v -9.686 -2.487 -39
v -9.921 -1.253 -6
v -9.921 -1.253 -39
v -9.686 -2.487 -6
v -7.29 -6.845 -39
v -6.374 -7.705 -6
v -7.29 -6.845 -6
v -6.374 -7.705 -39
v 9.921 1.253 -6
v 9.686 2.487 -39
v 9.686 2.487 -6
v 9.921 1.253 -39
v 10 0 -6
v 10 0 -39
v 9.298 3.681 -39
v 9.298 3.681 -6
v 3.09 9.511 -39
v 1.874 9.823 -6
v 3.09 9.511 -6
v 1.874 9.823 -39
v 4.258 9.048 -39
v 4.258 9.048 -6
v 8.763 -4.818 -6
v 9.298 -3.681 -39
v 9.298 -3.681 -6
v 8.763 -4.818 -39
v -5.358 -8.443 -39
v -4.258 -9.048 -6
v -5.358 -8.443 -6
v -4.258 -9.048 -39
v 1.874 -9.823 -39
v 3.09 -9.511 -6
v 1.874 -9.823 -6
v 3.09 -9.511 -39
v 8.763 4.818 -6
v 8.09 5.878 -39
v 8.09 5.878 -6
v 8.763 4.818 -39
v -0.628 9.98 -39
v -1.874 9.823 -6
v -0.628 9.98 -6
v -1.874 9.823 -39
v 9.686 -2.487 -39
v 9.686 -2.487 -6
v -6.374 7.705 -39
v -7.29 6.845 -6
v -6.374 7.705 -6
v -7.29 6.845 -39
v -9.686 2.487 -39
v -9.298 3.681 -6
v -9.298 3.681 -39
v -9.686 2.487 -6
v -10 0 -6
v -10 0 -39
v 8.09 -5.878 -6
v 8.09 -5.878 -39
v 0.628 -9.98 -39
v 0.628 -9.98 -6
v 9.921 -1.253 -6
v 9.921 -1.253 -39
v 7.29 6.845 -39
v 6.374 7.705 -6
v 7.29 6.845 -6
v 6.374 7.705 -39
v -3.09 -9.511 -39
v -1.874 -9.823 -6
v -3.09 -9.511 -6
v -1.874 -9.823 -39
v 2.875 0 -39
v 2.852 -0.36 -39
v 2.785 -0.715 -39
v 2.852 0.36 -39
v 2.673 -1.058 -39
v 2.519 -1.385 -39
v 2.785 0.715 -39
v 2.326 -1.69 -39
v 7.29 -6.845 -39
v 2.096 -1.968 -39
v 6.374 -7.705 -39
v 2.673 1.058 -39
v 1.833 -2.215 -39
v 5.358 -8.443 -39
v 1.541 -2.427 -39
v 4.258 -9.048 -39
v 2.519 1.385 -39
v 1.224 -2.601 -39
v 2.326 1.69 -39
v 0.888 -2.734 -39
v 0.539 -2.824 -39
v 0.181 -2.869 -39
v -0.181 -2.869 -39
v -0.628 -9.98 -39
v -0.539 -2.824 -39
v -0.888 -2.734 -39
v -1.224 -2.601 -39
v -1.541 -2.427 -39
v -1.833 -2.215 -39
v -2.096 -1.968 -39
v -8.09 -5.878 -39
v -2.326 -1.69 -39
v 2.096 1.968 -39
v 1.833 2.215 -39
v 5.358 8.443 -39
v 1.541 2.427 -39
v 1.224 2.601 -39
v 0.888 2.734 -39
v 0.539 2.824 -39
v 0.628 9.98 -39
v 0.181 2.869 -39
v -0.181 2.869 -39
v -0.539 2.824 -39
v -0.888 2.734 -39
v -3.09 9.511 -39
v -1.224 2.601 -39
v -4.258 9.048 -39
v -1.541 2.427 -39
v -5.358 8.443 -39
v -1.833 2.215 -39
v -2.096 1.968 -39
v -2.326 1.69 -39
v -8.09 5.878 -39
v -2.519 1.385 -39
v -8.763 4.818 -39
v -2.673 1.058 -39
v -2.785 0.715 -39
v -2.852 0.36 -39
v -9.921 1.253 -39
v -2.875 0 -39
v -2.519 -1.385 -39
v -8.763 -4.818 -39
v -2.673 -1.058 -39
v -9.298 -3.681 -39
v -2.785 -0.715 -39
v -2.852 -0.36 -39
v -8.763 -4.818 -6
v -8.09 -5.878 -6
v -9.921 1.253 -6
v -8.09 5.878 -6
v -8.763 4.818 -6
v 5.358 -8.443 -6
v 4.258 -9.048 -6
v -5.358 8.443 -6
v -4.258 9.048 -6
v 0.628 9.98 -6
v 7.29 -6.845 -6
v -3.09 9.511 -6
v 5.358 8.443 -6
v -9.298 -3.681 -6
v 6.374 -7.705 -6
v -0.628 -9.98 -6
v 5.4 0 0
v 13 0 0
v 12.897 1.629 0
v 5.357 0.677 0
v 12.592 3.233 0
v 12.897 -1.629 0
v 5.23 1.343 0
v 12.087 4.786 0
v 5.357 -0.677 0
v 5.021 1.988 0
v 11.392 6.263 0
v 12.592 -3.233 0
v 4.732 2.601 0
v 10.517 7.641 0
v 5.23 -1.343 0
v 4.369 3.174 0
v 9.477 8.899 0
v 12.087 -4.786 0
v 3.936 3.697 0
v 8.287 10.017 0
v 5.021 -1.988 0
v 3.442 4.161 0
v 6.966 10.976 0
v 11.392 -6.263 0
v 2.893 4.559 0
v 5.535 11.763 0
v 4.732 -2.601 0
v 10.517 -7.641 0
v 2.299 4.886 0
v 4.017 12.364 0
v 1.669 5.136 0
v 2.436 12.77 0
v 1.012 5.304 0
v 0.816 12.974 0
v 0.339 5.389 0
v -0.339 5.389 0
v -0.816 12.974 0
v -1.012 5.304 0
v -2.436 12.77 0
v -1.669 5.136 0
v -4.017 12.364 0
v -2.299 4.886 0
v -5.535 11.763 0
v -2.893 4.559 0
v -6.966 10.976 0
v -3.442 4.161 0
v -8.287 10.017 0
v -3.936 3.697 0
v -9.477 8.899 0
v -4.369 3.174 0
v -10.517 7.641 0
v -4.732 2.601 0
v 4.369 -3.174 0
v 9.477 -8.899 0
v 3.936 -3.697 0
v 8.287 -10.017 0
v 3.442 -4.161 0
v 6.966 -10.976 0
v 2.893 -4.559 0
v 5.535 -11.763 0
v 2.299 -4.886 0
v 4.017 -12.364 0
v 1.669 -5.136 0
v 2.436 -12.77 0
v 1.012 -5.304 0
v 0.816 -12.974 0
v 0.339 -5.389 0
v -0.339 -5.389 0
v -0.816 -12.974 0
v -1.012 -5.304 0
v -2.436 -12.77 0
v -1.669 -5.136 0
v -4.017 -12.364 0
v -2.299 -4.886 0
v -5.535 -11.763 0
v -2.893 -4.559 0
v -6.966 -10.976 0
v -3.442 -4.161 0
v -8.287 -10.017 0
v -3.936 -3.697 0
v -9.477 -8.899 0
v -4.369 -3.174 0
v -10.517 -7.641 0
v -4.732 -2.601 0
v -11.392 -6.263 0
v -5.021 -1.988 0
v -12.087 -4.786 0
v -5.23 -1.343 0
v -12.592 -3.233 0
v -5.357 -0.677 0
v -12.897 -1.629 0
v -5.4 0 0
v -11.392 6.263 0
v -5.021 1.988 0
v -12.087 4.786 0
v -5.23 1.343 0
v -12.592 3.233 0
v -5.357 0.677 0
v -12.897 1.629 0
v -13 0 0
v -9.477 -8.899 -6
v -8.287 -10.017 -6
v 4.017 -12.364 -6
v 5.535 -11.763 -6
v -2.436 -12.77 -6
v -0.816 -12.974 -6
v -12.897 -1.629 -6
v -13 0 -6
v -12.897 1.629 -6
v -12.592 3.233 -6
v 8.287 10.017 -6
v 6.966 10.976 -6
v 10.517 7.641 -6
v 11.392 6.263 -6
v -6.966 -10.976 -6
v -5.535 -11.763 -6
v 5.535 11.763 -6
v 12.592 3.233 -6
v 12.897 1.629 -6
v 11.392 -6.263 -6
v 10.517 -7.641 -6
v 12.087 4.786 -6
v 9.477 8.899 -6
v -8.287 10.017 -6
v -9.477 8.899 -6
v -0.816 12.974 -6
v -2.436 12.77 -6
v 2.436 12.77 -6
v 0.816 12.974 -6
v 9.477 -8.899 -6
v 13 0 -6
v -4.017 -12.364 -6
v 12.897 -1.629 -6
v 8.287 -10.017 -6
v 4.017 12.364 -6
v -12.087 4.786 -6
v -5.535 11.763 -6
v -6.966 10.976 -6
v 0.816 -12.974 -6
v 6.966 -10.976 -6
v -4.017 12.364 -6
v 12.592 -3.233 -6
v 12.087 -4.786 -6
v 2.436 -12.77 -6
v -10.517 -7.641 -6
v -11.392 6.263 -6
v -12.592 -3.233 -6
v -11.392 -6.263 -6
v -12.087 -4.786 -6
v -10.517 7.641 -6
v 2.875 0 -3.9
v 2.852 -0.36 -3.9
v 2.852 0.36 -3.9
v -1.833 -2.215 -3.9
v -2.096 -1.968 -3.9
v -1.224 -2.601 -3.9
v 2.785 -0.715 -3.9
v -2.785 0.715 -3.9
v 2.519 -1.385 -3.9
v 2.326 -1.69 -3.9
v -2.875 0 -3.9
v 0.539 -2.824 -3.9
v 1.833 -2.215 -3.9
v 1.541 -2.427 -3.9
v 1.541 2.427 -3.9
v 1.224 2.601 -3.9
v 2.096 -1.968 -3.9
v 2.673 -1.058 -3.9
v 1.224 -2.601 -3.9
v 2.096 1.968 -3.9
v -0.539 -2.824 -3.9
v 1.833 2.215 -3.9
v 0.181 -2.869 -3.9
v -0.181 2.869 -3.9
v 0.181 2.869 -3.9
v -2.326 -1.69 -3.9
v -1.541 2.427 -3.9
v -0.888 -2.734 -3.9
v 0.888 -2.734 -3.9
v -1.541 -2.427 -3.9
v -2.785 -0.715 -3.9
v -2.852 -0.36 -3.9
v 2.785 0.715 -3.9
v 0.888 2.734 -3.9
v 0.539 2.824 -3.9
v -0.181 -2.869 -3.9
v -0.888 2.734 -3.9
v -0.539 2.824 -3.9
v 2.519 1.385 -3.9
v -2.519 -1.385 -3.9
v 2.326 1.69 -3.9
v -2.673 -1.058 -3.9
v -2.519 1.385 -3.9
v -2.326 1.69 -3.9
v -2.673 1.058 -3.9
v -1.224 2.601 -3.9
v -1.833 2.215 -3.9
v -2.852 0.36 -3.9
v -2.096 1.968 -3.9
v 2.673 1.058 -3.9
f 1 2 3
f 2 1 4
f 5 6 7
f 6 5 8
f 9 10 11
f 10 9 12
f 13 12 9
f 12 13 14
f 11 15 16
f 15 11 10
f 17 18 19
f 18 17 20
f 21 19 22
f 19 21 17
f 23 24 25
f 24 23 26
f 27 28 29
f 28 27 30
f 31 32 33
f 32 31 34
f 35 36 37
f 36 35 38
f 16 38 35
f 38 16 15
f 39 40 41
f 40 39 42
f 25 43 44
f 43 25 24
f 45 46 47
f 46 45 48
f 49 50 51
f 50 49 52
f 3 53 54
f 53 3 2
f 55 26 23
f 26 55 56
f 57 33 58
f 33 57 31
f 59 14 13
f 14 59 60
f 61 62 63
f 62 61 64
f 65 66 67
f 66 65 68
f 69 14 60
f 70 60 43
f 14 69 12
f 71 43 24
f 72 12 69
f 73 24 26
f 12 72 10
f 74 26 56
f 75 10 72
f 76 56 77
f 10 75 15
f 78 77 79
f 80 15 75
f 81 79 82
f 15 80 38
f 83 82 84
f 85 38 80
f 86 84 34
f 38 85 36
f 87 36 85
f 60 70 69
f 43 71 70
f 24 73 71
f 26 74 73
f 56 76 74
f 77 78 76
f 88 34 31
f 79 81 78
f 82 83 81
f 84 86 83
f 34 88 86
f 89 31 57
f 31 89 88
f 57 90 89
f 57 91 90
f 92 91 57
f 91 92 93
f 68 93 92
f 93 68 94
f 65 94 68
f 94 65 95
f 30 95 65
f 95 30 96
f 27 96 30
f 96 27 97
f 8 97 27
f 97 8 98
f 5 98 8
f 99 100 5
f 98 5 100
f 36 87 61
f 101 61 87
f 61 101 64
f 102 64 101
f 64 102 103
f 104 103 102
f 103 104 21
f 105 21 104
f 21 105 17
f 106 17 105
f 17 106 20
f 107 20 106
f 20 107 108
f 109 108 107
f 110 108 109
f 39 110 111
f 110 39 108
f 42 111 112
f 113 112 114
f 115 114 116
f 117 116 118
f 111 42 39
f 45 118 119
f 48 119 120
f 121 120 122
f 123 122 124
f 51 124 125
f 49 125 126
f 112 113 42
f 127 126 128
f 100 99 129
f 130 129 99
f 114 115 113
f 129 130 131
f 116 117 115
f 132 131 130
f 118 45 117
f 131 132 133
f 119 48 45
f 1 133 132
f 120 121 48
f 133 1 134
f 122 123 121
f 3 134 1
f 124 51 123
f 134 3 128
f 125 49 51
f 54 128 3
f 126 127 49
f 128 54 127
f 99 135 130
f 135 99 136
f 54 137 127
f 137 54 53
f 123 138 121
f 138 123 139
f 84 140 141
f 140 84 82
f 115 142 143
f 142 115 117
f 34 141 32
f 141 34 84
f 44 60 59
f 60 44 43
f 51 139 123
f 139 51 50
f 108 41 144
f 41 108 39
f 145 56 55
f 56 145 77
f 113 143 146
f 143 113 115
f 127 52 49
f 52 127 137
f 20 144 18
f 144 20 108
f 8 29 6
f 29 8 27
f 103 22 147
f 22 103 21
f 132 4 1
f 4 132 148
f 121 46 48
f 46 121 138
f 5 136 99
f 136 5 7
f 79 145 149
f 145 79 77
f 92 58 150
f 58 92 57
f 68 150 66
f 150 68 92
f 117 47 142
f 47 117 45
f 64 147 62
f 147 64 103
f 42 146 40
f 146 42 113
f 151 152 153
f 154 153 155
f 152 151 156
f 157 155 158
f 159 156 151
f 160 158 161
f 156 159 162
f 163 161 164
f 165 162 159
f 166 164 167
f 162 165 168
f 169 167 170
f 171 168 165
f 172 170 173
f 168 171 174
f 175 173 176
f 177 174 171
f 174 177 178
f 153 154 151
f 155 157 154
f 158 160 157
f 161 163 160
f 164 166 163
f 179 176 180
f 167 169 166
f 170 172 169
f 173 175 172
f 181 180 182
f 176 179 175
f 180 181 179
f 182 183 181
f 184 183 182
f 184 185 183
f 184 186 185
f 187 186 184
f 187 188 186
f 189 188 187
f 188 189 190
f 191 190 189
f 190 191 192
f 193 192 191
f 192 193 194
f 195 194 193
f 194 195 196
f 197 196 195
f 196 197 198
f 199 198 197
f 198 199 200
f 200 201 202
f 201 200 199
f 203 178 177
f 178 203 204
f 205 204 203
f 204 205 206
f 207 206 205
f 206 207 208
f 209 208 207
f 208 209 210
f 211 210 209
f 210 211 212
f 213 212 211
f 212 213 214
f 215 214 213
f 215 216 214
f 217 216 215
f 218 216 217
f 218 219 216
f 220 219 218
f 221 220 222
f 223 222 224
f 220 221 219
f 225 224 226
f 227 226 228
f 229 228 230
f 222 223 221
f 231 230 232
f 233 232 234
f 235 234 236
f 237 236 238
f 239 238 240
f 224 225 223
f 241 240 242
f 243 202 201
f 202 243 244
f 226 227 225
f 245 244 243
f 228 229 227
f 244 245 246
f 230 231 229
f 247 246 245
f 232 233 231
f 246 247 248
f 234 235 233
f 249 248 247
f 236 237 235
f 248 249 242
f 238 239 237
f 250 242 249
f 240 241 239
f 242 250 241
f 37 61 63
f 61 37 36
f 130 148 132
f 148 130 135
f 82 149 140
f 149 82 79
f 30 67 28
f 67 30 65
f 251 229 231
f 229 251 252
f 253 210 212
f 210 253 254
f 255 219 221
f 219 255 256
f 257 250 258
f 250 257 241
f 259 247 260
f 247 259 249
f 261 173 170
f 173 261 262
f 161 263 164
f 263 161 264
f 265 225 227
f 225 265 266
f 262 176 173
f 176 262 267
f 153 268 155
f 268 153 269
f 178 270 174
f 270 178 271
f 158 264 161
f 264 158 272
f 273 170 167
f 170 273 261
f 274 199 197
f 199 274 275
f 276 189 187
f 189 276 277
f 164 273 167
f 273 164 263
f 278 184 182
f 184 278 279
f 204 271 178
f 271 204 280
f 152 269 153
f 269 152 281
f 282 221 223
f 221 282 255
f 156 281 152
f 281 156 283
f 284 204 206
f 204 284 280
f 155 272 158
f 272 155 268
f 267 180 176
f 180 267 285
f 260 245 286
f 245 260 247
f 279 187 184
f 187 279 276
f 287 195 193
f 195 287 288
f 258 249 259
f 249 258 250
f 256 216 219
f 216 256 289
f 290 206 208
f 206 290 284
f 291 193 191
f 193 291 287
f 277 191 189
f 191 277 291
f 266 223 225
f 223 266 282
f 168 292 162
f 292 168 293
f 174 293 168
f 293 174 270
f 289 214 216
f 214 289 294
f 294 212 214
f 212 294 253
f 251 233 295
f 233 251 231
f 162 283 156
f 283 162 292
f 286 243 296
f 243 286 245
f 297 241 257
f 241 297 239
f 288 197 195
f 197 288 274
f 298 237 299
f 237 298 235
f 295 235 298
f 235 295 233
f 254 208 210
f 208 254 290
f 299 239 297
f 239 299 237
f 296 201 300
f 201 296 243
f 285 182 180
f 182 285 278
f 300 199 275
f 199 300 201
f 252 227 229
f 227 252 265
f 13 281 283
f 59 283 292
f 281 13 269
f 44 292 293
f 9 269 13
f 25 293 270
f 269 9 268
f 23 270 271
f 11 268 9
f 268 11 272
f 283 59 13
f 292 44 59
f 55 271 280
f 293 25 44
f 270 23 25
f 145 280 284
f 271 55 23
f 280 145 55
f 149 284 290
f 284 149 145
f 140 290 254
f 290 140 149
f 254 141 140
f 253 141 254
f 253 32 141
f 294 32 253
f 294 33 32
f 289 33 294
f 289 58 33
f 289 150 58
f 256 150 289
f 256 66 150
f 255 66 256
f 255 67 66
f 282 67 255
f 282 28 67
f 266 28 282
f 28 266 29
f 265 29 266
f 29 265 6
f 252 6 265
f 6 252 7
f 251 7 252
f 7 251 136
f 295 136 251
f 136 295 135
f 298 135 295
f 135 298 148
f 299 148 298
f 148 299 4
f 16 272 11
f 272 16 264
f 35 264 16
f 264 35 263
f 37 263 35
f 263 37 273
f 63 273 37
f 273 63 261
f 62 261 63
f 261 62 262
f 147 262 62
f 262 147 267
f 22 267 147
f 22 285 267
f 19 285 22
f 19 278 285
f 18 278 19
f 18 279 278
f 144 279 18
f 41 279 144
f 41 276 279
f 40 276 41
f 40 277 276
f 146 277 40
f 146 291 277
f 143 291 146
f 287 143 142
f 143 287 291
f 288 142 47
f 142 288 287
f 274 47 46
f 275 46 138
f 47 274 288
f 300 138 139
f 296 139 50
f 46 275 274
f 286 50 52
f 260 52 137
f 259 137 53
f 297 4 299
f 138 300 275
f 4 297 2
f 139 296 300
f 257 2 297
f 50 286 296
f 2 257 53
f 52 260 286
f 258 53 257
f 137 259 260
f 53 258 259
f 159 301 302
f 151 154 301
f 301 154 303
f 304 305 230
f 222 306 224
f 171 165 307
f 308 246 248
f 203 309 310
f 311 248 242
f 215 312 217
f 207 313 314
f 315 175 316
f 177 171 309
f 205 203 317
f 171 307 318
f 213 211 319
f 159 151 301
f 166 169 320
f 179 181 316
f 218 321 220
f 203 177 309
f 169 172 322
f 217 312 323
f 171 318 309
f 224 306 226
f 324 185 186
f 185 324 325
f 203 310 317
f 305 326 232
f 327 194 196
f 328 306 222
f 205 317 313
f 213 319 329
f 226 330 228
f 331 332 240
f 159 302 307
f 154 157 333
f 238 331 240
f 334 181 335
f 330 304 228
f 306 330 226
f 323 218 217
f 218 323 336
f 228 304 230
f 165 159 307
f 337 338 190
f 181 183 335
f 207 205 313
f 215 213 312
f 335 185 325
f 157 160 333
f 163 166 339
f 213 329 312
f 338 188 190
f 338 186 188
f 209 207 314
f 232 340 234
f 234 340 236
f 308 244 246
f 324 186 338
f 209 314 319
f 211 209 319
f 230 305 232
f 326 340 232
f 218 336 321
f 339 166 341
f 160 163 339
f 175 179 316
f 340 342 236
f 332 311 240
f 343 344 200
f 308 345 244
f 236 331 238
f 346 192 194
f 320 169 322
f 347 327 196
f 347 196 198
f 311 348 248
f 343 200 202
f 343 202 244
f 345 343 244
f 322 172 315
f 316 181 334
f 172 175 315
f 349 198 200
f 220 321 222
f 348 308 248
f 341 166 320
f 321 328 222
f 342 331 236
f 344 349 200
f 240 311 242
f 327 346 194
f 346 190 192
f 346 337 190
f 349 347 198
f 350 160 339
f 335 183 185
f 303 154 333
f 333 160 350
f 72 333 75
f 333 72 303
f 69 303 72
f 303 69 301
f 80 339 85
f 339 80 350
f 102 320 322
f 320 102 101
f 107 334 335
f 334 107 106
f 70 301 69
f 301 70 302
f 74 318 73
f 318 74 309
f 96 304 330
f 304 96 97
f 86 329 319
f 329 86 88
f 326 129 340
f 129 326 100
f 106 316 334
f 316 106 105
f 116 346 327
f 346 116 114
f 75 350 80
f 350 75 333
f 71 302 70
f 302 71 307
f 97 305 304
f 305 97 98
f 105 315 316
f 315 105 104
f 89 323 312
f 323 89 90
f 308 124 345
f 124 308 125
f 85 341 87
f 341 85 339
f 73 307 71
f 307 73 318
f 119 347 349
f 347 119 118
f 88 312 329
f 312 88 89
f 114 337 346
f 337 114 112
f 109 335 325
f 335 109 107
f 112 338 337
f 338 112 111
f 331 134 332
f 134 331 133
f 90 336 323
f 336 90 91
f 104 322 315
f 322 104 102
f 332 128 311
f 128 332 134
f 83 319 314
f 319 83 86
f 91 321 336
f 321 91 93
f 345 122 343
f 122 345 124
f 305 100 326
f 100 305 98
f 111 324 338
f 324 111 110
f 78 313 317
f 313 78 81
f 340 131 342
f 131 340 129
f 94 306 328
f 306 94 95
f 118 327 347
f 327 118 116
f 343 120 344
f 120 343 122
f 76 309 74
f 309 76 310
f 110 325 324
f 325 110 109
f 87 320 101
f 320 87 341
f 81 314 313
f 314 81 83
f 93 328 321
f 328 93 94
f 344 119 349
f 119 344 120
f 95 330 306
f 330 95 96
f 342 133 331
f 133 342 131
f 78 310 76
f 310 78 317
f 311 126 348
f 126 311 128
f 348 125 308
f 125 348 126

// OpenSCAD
$fn = 50;


difference() {
	union() {
		translate(v = [0, 0, -39.0000000000]) {
			cylinder(h = 39, r = 10.0000000000);
		}
		translate(v = [0, 0, -6.0000000000]) {
			cylinder(h = 6, r = 13.0000000000);
		}
	}
	union() {
		translate(v = [0, 0, 0]) {
			rotate(a = [0, 0, 0]) {
				difference() {
					union() {
						#translate(v = [0, 0, -39.0000000000]) {
							cylinder(h = 39, r = 2.6000000000);
						}
						#translate(v = [0, 0, -3.9000000000]) {
							cylinder(h = 3.9000000000, r1 = 2.8750000000, r2 = 5.4000000000);
						}
						#translate(v = [0, 0, -39.0000000000]) {
							cylinder(h = 39, r = 2.8750000000);
						}
						#translate(v = [0, 0, -39.0000000000]) {
							cylinder(h = 39, r = 2.6000000000);
						}
					}
					union();
				}
			}
		}
	}
}
